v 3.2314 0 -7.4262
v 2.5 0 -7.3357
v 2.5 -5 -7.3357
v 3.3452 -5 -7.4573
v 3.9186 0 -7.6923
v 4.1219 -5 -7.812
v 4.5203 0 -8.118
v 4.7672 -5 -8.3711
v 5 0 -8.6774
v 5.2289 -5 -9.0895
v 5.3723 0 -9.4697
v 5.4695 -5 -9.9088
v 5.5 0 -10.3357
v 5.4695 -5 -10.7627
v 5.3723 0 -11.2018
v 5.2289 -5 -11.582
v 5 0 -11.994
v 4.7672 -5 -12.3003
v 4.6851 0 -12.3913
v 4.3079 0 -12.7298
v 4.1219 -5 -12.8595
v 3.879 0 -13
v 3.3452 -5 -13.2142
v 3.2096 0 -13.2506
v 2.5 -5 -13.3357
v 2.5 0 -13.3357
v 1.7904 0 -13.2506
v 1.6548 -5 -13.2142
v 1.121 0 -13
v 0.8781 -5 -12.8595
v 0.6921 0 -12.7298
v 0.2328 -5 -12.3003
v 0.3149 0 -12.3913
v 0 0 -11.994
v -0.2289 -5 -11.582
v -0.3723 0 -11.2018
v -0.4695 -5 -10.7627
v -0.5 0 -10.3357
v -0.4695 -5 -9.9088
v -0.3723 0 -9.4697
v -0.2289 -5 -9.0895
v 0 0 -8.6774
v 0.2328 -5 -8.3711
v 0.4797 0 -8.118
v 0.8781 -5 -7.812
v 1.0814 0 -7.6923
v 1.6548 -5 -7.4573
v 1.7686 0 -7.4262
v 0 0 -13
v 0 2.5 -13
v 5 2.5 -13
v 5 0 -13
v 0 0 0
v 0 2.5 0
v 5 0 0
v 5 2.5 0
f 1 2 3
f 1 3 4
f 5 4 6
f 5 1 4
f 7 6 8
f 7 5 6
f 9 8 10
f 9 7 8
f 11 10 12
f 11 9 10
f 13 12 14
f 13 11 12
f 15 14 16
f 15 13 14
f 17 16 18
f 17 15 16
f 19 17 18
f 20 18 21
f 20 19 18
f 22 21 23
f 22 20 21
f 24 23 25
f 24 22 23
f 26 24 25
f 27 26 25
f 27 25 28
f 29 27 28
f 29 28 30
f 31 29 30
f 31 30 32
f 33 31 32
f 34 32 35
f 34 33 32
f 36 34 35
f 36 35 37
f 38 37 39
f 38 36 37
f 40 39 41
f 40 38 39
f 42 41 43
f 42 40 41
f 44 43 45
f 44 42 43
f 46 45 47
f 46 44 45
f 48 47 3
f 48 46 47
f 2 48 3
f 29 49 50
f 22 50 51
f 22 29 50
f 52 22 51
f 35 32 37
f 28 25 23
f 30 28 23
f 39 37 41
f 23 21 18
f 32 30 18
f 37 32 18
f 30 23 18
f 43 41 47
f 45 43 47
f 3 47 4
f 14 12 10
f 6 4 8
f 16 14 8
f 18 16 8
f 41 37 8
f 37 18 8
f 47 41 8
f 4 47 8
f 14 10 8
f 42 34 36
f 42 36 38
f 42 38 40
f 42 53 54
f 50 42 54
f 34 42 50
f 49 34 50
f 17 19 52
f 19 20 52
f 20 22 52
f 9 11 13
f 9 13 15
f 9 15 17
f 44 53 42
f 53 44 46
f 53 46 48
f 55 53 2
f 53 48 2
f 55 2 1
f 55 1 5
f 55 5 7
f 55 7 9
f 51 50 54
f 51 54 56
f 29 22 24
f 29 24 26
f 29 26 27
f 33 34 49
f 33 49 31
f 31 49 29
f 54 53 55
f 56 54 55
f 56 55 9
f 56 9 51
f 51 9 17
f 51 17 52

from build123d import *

# Parameters (mm, degrees)
SKETCH1_W           = 5
SKETCH1_H           = 13
BOSS_EXTRUDE1_DEPTH = 2.5
SKETCH2_R           = 3
BOSS_EXTRUDE2_DEPTH = 5


with BuildPart() as part:
    # Sketch1 → Boss-Extrude1 (new body)
    with BuildSketch(Plane(origin=(0, 0, 0), x_dir=(1, 0, 0), z_dir=(0, 1, 0))):
        with Locations((2.5, 6.5)):
            Rectangle(SKETCH1_W, SKETCH1_H)
    extrude(amount=BOSS_EXTRUDE1_DEPTH)

    # Sketch2 → Boss-Extrude2 (add)
    with BuildSketch(Plane(origin=(0, 0, 0), x_dir=(1, 0, 0), z_dir=(0, 1, 0))):
        with Locations(Location((2.5, 10.335729582, 0), (0, 0, 270))):
            Circle(SKETCH2_R)
    extrude(amount=-BOSS_EXTRUDE2_DEPTH)


solid = part.part
